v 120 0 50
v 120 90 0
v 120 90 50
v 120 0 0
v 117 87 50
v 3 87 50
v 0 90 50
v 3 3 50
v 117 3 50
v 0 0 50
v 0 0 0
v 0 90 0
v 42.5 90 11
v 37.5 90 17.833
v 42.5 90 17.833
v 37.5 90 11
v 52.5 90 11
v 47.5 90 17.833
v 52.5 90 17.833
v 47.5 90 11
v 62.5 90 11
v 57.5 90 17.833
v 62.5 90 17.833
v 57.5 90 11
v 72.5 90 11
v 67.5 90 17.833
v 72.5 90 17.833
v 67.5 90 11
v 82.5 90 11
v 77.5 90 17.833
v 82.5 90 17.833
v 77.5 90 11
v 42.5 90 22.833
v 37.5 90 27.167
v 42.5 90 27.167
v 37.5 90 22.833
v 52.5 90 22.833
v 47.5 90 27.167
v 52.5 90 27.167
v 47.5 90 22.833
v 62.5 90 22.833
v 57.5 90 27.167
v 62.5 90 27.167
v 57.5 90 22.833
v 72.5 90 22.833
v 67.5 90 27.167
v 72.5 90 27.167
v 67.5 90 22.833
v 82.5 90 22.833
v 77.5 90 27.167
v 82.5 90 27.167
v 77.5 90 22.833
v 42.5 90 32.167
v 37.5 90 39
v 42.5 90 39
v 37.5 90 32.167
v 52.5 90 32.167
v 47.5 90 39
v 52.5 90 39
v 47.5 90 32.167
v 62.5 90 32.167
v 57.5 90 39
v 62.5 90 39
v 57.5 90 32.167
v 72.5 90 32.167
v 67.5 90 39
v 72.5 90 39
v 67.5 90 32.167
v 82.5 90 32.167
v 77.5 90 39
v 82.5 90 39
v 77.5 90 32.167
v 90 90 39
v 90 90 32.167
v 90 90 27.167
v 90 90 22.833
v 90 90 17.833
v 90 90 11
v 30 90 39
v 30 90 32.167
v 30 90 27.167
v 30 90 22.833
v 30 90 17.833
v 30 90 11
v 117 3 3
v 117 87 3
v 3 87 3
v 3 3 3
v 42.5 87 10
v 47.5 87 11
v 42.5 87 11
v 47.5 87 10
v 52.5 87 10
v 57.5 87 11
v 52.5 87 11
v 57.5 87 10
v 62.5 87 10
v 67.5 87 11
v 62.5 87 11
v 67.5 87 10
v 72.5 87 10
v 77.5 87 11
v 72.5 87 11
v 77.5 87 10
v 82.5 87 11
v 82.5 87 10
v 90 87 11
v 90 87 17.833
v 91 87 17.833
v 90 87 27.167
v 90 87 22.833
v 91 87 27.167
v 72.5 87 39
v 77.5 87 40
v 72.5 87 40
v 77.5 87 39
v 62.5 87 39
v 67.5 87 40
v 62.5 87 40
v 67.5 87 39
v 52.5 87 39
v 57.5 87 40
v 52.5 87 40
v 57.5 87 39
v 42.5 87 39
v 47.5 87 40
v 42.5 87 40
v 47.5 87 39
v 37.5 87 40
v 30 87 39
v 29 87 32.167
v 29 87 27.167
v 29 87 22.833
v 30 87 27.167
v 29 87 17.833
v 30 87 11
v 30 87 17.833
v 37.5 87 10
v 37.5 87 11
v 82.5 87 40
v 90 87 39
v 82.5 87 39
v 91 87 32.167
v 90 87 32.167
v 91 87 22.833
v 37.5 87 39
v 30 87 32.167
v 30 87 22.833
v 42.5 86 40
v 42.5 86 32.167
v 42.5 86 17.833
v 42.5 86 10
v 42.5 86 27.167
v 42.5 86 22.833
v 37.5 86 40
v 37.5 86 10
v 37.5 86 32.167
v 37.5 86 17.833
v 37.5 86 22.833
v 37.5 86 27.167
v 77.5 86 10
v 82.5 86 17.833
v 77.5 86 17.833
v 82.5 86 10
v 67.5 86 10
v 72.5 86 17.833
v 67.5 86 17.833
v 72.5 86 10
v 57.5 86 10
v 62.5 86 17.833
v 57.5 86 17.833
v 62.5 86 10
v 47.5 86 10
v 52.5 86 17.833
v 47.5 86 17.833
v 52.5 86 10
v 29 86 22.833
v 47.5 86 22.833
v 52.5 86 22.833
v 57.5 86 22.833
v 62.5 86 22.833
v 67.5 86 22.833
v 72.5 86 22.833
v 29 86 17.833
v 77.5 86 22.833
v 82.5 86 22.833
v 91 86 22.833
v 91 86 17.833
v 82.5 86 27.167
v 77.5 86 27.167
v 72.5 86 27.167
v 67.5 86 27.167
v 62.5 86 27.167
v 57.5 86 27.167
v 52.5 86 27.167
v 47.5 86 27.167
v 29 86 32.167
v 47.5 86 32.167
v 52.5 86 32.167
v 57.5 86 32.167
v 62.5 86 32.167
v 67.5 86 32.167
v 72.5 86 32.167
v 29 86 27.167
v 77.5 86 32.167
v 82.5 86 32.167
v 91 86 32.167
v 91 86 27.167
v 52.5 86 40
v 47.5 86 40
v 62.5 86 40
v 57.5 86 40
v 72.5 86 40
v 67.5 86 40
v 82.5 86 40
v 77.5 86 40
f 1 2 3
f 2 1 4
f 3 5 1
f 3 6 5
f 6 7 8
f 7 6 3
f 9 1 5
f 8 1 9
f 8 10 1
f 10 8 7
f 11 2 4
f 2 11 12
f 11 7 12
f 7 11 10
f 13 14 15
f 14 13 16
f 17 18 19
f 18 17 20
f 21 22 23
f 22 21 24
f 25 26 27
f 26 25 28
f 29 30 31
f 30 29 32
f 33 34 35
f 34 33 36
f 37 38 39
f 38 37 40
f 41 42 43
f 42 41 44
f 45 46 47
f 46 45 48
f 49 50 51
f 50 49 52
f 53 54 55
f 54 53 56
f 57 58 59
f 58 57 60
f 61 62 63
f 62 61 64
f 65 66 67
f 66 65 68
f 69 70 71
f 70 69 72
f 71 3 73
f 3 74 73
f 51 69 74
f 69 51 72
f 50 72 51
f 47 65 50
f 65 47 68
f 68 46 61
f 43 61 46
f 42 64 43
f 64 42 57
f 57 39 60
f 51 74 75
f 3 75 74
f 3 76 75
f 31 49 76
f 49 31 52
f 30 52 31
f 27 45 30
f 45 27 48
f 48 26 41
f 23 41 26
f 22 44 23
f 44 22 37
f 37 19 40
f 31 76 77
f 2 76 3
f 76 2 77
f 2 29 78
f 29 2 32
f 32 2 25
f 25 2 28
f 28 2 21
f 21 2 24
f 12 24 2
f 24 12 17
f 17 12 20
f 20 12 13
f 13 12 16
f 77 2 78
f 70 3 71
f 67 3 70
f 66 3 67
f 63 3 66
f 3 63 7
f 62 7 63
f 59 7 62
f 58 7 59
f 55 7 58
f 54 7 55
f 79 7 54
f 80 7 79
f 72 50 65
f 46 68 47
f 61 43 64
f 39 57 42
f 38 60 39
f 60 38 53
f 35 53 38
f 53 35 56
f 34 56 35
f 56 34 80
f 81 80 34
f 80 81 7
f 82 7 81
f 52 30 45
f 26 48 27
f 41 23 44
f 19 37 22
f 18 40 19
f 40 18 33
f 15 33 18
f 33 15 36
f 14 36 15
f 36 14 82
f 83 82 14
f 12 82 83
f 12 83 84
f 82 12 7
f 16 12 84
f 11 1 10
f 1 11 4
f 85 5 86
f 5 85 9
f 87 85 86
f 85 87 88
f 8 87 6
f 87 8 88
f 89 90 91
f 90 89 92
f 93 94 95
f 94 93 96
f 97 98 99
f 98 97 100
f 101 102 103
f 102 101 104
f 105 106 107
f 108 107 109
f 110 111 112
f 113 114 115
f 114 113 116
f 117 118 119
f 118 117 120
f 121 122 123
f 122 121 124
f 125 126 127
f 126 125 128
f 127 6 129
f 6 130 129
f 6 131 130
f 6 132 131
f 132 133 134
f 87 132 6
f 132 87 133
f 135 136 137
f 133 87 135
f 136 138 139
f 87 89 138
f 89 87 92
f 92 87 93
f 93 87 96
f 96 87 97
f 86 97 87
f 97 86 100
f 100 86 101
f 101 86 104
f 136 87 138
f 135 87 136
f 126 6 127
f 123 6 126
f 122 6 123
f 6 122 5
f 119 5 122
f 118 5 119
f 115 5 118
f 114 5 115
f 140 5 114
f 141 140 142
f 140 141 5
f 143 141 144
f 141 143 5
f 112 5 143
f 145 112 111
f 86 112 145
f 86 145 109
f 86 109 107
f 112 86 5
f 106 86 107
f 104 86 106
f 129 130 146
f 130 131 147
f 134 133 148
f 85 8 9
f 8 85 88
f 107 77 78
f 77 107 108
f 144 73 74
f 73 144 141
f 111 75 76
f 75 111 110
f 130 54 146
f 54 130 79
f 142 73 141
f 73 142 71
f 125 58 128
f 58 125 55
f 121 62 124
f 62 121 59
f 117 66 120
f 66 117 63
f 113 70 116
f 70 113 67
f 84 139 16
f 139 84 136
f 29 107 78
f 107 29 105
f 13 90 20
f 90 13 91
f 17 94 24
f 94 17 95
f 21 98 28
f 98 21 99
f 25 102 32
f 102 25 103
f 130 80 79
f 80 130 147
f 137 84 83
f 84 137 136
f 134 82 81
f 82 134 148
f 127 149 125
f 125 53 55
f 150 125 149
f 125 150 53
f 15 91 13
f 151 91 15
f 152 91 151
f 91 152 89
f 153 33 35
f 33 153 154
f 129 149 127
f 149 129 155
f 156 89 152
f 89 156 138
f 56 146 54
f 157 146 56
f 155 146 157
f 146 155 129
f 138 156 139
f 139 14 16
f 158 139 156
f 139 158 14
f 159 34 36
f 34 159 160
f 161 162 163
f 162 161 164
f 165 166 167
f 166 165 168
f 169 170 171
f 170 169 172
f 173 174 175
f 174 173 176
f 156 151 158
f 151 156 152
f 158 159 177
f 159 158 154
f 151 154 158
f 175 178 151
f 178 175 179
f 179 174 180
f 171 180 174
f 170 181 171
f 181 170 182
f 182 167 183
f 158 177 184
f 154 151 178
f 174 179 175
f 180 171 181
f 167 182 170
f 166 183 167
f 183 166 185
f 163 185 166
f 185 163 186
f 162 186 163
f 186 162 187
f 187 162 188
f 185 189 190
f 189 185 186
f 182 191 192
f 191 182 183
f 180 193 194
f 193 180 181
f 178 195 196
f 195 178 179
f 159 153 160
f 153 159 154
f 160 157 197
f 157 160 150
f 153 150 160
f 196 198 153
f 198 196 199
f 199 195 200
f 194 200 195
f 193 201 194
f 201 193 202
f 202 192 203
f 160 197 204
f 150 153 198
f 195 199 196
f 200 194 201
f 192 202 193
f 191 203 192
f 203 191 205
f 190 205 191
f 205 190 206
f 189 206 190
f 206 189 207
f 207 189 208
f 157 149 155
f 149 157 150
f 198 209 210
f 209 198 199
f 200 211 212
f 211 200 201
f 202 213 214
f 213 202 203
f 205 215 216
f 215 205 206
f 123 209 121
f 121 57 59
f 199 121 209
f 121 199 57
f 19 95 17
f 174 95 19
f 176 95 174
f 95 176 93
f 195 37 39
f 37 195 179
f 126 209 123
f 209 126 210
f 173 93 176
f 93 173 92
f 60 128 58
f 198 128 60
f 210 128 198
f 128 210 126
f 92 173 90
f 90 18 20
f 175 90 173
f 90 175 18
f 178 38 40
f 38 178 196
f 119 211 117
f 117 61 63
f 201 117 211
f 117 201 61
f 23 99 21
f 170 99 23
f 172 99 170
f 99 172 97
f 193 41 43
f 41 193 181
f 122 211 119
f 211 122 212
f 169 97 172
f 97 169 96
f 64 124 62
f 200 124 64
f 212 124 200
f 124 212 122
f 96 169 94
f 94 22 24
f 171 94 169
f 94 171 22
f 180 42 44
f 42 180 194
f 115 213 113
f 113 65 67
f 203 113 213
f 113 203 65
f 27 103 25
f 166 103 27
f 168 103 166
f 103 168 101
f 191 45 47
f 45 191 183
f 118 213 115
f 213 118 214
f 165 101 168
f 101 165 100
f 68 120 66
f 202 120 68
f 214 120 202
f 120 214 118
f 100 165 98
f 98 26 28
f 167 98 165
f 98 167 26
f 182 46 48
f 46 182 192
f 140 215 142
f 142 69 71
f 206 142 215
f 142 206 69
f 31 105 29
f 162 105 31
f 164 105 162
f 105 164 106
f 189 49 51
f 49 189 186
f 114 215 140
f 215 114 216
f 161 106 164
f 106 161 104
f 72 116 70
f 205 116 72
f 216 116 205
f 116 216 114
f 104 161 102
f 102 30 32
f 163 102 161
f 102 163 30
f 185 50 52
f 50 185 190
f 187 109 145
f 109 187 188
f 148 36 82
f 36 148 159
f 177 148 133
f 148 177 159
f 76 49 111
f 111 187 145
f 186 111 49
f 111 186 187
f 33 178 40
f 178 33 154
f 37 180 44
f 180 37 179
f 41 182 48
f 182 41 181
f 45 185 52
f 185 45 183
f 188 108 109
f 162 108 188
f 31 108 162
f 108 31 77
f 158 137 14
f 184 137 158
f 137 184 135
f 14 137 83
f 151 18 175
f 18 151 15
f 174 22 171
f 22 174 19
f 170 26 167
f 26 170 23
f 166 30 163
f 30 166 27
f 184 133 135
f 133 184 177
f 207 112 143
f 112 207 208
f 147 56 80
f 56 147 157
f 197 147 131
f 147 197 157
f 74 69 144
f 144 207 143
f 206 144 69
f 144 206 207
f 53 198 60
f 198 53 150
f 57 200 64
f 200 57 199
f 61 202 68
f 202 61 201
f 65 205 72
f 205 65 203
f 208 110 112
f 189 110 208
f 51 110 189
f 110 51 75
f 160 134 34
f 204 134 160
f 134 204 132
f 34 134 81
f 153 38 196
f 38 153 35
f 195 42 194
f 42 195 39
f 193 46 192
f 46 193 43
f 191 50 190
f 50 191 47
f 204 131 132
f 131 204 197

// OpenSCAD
$fn = 32;

// ----------------------------------------------------------------------
// Vent box: crossgrid enclosure
// ----------------------------------------------------------------------

// --- parameters (mm) ---
box_l = 120;              // box length, X
box_w = 90;               // box width, Y
box_h = 50;               // box height, Z
wall_t = 3;               // shell wall thickness
win_l = 60;               // vent window width, X
win_h = 28;               // vent window height, Z
bar_w = 5;                // grid bar width
n_v = 5;                  // vertical bar count
n_h = 2;                  // horizontal bar count

win_z0 = (box_h - win_h) / 2;  // window lower edge Z
v_step = win_l / (n_v + 1);  // vertical bar step
h_step = win_h / (n_h + 1);  // horizontal bar step

difference() {
  union() {
    difference() {
      cube([box_l, box_w, box_h]);
  translate([wall_t, wall_t, wall_t])
    cube([box_l - 2 * wall_t, box_w - 2 * wall_t, box_h]);
  translate([(box_l - win_l) / 2, box_w - wall_t - 1, win_z0])
    cube([win_l, wall_t + 2, win_h]);
    }
    for (i = [1 : n_v])
      translate([(box_l - win_l) / 2 + i * v_step - bar_w / 2,
                 box_w - wall_t - 1, win_z0 - 1])
        cube([bar_w, wall_t + 1, win_h + 2]);
    for (i = [1 : n_h])
      translate([(box_l - win_l) / 2 - 1, box_w - wall_t - 1,
                 win_z0 + i * h_step - bar_w / 2])
        cube([win_l + 2, wall_t + 1, bar_w]);
  }
}
